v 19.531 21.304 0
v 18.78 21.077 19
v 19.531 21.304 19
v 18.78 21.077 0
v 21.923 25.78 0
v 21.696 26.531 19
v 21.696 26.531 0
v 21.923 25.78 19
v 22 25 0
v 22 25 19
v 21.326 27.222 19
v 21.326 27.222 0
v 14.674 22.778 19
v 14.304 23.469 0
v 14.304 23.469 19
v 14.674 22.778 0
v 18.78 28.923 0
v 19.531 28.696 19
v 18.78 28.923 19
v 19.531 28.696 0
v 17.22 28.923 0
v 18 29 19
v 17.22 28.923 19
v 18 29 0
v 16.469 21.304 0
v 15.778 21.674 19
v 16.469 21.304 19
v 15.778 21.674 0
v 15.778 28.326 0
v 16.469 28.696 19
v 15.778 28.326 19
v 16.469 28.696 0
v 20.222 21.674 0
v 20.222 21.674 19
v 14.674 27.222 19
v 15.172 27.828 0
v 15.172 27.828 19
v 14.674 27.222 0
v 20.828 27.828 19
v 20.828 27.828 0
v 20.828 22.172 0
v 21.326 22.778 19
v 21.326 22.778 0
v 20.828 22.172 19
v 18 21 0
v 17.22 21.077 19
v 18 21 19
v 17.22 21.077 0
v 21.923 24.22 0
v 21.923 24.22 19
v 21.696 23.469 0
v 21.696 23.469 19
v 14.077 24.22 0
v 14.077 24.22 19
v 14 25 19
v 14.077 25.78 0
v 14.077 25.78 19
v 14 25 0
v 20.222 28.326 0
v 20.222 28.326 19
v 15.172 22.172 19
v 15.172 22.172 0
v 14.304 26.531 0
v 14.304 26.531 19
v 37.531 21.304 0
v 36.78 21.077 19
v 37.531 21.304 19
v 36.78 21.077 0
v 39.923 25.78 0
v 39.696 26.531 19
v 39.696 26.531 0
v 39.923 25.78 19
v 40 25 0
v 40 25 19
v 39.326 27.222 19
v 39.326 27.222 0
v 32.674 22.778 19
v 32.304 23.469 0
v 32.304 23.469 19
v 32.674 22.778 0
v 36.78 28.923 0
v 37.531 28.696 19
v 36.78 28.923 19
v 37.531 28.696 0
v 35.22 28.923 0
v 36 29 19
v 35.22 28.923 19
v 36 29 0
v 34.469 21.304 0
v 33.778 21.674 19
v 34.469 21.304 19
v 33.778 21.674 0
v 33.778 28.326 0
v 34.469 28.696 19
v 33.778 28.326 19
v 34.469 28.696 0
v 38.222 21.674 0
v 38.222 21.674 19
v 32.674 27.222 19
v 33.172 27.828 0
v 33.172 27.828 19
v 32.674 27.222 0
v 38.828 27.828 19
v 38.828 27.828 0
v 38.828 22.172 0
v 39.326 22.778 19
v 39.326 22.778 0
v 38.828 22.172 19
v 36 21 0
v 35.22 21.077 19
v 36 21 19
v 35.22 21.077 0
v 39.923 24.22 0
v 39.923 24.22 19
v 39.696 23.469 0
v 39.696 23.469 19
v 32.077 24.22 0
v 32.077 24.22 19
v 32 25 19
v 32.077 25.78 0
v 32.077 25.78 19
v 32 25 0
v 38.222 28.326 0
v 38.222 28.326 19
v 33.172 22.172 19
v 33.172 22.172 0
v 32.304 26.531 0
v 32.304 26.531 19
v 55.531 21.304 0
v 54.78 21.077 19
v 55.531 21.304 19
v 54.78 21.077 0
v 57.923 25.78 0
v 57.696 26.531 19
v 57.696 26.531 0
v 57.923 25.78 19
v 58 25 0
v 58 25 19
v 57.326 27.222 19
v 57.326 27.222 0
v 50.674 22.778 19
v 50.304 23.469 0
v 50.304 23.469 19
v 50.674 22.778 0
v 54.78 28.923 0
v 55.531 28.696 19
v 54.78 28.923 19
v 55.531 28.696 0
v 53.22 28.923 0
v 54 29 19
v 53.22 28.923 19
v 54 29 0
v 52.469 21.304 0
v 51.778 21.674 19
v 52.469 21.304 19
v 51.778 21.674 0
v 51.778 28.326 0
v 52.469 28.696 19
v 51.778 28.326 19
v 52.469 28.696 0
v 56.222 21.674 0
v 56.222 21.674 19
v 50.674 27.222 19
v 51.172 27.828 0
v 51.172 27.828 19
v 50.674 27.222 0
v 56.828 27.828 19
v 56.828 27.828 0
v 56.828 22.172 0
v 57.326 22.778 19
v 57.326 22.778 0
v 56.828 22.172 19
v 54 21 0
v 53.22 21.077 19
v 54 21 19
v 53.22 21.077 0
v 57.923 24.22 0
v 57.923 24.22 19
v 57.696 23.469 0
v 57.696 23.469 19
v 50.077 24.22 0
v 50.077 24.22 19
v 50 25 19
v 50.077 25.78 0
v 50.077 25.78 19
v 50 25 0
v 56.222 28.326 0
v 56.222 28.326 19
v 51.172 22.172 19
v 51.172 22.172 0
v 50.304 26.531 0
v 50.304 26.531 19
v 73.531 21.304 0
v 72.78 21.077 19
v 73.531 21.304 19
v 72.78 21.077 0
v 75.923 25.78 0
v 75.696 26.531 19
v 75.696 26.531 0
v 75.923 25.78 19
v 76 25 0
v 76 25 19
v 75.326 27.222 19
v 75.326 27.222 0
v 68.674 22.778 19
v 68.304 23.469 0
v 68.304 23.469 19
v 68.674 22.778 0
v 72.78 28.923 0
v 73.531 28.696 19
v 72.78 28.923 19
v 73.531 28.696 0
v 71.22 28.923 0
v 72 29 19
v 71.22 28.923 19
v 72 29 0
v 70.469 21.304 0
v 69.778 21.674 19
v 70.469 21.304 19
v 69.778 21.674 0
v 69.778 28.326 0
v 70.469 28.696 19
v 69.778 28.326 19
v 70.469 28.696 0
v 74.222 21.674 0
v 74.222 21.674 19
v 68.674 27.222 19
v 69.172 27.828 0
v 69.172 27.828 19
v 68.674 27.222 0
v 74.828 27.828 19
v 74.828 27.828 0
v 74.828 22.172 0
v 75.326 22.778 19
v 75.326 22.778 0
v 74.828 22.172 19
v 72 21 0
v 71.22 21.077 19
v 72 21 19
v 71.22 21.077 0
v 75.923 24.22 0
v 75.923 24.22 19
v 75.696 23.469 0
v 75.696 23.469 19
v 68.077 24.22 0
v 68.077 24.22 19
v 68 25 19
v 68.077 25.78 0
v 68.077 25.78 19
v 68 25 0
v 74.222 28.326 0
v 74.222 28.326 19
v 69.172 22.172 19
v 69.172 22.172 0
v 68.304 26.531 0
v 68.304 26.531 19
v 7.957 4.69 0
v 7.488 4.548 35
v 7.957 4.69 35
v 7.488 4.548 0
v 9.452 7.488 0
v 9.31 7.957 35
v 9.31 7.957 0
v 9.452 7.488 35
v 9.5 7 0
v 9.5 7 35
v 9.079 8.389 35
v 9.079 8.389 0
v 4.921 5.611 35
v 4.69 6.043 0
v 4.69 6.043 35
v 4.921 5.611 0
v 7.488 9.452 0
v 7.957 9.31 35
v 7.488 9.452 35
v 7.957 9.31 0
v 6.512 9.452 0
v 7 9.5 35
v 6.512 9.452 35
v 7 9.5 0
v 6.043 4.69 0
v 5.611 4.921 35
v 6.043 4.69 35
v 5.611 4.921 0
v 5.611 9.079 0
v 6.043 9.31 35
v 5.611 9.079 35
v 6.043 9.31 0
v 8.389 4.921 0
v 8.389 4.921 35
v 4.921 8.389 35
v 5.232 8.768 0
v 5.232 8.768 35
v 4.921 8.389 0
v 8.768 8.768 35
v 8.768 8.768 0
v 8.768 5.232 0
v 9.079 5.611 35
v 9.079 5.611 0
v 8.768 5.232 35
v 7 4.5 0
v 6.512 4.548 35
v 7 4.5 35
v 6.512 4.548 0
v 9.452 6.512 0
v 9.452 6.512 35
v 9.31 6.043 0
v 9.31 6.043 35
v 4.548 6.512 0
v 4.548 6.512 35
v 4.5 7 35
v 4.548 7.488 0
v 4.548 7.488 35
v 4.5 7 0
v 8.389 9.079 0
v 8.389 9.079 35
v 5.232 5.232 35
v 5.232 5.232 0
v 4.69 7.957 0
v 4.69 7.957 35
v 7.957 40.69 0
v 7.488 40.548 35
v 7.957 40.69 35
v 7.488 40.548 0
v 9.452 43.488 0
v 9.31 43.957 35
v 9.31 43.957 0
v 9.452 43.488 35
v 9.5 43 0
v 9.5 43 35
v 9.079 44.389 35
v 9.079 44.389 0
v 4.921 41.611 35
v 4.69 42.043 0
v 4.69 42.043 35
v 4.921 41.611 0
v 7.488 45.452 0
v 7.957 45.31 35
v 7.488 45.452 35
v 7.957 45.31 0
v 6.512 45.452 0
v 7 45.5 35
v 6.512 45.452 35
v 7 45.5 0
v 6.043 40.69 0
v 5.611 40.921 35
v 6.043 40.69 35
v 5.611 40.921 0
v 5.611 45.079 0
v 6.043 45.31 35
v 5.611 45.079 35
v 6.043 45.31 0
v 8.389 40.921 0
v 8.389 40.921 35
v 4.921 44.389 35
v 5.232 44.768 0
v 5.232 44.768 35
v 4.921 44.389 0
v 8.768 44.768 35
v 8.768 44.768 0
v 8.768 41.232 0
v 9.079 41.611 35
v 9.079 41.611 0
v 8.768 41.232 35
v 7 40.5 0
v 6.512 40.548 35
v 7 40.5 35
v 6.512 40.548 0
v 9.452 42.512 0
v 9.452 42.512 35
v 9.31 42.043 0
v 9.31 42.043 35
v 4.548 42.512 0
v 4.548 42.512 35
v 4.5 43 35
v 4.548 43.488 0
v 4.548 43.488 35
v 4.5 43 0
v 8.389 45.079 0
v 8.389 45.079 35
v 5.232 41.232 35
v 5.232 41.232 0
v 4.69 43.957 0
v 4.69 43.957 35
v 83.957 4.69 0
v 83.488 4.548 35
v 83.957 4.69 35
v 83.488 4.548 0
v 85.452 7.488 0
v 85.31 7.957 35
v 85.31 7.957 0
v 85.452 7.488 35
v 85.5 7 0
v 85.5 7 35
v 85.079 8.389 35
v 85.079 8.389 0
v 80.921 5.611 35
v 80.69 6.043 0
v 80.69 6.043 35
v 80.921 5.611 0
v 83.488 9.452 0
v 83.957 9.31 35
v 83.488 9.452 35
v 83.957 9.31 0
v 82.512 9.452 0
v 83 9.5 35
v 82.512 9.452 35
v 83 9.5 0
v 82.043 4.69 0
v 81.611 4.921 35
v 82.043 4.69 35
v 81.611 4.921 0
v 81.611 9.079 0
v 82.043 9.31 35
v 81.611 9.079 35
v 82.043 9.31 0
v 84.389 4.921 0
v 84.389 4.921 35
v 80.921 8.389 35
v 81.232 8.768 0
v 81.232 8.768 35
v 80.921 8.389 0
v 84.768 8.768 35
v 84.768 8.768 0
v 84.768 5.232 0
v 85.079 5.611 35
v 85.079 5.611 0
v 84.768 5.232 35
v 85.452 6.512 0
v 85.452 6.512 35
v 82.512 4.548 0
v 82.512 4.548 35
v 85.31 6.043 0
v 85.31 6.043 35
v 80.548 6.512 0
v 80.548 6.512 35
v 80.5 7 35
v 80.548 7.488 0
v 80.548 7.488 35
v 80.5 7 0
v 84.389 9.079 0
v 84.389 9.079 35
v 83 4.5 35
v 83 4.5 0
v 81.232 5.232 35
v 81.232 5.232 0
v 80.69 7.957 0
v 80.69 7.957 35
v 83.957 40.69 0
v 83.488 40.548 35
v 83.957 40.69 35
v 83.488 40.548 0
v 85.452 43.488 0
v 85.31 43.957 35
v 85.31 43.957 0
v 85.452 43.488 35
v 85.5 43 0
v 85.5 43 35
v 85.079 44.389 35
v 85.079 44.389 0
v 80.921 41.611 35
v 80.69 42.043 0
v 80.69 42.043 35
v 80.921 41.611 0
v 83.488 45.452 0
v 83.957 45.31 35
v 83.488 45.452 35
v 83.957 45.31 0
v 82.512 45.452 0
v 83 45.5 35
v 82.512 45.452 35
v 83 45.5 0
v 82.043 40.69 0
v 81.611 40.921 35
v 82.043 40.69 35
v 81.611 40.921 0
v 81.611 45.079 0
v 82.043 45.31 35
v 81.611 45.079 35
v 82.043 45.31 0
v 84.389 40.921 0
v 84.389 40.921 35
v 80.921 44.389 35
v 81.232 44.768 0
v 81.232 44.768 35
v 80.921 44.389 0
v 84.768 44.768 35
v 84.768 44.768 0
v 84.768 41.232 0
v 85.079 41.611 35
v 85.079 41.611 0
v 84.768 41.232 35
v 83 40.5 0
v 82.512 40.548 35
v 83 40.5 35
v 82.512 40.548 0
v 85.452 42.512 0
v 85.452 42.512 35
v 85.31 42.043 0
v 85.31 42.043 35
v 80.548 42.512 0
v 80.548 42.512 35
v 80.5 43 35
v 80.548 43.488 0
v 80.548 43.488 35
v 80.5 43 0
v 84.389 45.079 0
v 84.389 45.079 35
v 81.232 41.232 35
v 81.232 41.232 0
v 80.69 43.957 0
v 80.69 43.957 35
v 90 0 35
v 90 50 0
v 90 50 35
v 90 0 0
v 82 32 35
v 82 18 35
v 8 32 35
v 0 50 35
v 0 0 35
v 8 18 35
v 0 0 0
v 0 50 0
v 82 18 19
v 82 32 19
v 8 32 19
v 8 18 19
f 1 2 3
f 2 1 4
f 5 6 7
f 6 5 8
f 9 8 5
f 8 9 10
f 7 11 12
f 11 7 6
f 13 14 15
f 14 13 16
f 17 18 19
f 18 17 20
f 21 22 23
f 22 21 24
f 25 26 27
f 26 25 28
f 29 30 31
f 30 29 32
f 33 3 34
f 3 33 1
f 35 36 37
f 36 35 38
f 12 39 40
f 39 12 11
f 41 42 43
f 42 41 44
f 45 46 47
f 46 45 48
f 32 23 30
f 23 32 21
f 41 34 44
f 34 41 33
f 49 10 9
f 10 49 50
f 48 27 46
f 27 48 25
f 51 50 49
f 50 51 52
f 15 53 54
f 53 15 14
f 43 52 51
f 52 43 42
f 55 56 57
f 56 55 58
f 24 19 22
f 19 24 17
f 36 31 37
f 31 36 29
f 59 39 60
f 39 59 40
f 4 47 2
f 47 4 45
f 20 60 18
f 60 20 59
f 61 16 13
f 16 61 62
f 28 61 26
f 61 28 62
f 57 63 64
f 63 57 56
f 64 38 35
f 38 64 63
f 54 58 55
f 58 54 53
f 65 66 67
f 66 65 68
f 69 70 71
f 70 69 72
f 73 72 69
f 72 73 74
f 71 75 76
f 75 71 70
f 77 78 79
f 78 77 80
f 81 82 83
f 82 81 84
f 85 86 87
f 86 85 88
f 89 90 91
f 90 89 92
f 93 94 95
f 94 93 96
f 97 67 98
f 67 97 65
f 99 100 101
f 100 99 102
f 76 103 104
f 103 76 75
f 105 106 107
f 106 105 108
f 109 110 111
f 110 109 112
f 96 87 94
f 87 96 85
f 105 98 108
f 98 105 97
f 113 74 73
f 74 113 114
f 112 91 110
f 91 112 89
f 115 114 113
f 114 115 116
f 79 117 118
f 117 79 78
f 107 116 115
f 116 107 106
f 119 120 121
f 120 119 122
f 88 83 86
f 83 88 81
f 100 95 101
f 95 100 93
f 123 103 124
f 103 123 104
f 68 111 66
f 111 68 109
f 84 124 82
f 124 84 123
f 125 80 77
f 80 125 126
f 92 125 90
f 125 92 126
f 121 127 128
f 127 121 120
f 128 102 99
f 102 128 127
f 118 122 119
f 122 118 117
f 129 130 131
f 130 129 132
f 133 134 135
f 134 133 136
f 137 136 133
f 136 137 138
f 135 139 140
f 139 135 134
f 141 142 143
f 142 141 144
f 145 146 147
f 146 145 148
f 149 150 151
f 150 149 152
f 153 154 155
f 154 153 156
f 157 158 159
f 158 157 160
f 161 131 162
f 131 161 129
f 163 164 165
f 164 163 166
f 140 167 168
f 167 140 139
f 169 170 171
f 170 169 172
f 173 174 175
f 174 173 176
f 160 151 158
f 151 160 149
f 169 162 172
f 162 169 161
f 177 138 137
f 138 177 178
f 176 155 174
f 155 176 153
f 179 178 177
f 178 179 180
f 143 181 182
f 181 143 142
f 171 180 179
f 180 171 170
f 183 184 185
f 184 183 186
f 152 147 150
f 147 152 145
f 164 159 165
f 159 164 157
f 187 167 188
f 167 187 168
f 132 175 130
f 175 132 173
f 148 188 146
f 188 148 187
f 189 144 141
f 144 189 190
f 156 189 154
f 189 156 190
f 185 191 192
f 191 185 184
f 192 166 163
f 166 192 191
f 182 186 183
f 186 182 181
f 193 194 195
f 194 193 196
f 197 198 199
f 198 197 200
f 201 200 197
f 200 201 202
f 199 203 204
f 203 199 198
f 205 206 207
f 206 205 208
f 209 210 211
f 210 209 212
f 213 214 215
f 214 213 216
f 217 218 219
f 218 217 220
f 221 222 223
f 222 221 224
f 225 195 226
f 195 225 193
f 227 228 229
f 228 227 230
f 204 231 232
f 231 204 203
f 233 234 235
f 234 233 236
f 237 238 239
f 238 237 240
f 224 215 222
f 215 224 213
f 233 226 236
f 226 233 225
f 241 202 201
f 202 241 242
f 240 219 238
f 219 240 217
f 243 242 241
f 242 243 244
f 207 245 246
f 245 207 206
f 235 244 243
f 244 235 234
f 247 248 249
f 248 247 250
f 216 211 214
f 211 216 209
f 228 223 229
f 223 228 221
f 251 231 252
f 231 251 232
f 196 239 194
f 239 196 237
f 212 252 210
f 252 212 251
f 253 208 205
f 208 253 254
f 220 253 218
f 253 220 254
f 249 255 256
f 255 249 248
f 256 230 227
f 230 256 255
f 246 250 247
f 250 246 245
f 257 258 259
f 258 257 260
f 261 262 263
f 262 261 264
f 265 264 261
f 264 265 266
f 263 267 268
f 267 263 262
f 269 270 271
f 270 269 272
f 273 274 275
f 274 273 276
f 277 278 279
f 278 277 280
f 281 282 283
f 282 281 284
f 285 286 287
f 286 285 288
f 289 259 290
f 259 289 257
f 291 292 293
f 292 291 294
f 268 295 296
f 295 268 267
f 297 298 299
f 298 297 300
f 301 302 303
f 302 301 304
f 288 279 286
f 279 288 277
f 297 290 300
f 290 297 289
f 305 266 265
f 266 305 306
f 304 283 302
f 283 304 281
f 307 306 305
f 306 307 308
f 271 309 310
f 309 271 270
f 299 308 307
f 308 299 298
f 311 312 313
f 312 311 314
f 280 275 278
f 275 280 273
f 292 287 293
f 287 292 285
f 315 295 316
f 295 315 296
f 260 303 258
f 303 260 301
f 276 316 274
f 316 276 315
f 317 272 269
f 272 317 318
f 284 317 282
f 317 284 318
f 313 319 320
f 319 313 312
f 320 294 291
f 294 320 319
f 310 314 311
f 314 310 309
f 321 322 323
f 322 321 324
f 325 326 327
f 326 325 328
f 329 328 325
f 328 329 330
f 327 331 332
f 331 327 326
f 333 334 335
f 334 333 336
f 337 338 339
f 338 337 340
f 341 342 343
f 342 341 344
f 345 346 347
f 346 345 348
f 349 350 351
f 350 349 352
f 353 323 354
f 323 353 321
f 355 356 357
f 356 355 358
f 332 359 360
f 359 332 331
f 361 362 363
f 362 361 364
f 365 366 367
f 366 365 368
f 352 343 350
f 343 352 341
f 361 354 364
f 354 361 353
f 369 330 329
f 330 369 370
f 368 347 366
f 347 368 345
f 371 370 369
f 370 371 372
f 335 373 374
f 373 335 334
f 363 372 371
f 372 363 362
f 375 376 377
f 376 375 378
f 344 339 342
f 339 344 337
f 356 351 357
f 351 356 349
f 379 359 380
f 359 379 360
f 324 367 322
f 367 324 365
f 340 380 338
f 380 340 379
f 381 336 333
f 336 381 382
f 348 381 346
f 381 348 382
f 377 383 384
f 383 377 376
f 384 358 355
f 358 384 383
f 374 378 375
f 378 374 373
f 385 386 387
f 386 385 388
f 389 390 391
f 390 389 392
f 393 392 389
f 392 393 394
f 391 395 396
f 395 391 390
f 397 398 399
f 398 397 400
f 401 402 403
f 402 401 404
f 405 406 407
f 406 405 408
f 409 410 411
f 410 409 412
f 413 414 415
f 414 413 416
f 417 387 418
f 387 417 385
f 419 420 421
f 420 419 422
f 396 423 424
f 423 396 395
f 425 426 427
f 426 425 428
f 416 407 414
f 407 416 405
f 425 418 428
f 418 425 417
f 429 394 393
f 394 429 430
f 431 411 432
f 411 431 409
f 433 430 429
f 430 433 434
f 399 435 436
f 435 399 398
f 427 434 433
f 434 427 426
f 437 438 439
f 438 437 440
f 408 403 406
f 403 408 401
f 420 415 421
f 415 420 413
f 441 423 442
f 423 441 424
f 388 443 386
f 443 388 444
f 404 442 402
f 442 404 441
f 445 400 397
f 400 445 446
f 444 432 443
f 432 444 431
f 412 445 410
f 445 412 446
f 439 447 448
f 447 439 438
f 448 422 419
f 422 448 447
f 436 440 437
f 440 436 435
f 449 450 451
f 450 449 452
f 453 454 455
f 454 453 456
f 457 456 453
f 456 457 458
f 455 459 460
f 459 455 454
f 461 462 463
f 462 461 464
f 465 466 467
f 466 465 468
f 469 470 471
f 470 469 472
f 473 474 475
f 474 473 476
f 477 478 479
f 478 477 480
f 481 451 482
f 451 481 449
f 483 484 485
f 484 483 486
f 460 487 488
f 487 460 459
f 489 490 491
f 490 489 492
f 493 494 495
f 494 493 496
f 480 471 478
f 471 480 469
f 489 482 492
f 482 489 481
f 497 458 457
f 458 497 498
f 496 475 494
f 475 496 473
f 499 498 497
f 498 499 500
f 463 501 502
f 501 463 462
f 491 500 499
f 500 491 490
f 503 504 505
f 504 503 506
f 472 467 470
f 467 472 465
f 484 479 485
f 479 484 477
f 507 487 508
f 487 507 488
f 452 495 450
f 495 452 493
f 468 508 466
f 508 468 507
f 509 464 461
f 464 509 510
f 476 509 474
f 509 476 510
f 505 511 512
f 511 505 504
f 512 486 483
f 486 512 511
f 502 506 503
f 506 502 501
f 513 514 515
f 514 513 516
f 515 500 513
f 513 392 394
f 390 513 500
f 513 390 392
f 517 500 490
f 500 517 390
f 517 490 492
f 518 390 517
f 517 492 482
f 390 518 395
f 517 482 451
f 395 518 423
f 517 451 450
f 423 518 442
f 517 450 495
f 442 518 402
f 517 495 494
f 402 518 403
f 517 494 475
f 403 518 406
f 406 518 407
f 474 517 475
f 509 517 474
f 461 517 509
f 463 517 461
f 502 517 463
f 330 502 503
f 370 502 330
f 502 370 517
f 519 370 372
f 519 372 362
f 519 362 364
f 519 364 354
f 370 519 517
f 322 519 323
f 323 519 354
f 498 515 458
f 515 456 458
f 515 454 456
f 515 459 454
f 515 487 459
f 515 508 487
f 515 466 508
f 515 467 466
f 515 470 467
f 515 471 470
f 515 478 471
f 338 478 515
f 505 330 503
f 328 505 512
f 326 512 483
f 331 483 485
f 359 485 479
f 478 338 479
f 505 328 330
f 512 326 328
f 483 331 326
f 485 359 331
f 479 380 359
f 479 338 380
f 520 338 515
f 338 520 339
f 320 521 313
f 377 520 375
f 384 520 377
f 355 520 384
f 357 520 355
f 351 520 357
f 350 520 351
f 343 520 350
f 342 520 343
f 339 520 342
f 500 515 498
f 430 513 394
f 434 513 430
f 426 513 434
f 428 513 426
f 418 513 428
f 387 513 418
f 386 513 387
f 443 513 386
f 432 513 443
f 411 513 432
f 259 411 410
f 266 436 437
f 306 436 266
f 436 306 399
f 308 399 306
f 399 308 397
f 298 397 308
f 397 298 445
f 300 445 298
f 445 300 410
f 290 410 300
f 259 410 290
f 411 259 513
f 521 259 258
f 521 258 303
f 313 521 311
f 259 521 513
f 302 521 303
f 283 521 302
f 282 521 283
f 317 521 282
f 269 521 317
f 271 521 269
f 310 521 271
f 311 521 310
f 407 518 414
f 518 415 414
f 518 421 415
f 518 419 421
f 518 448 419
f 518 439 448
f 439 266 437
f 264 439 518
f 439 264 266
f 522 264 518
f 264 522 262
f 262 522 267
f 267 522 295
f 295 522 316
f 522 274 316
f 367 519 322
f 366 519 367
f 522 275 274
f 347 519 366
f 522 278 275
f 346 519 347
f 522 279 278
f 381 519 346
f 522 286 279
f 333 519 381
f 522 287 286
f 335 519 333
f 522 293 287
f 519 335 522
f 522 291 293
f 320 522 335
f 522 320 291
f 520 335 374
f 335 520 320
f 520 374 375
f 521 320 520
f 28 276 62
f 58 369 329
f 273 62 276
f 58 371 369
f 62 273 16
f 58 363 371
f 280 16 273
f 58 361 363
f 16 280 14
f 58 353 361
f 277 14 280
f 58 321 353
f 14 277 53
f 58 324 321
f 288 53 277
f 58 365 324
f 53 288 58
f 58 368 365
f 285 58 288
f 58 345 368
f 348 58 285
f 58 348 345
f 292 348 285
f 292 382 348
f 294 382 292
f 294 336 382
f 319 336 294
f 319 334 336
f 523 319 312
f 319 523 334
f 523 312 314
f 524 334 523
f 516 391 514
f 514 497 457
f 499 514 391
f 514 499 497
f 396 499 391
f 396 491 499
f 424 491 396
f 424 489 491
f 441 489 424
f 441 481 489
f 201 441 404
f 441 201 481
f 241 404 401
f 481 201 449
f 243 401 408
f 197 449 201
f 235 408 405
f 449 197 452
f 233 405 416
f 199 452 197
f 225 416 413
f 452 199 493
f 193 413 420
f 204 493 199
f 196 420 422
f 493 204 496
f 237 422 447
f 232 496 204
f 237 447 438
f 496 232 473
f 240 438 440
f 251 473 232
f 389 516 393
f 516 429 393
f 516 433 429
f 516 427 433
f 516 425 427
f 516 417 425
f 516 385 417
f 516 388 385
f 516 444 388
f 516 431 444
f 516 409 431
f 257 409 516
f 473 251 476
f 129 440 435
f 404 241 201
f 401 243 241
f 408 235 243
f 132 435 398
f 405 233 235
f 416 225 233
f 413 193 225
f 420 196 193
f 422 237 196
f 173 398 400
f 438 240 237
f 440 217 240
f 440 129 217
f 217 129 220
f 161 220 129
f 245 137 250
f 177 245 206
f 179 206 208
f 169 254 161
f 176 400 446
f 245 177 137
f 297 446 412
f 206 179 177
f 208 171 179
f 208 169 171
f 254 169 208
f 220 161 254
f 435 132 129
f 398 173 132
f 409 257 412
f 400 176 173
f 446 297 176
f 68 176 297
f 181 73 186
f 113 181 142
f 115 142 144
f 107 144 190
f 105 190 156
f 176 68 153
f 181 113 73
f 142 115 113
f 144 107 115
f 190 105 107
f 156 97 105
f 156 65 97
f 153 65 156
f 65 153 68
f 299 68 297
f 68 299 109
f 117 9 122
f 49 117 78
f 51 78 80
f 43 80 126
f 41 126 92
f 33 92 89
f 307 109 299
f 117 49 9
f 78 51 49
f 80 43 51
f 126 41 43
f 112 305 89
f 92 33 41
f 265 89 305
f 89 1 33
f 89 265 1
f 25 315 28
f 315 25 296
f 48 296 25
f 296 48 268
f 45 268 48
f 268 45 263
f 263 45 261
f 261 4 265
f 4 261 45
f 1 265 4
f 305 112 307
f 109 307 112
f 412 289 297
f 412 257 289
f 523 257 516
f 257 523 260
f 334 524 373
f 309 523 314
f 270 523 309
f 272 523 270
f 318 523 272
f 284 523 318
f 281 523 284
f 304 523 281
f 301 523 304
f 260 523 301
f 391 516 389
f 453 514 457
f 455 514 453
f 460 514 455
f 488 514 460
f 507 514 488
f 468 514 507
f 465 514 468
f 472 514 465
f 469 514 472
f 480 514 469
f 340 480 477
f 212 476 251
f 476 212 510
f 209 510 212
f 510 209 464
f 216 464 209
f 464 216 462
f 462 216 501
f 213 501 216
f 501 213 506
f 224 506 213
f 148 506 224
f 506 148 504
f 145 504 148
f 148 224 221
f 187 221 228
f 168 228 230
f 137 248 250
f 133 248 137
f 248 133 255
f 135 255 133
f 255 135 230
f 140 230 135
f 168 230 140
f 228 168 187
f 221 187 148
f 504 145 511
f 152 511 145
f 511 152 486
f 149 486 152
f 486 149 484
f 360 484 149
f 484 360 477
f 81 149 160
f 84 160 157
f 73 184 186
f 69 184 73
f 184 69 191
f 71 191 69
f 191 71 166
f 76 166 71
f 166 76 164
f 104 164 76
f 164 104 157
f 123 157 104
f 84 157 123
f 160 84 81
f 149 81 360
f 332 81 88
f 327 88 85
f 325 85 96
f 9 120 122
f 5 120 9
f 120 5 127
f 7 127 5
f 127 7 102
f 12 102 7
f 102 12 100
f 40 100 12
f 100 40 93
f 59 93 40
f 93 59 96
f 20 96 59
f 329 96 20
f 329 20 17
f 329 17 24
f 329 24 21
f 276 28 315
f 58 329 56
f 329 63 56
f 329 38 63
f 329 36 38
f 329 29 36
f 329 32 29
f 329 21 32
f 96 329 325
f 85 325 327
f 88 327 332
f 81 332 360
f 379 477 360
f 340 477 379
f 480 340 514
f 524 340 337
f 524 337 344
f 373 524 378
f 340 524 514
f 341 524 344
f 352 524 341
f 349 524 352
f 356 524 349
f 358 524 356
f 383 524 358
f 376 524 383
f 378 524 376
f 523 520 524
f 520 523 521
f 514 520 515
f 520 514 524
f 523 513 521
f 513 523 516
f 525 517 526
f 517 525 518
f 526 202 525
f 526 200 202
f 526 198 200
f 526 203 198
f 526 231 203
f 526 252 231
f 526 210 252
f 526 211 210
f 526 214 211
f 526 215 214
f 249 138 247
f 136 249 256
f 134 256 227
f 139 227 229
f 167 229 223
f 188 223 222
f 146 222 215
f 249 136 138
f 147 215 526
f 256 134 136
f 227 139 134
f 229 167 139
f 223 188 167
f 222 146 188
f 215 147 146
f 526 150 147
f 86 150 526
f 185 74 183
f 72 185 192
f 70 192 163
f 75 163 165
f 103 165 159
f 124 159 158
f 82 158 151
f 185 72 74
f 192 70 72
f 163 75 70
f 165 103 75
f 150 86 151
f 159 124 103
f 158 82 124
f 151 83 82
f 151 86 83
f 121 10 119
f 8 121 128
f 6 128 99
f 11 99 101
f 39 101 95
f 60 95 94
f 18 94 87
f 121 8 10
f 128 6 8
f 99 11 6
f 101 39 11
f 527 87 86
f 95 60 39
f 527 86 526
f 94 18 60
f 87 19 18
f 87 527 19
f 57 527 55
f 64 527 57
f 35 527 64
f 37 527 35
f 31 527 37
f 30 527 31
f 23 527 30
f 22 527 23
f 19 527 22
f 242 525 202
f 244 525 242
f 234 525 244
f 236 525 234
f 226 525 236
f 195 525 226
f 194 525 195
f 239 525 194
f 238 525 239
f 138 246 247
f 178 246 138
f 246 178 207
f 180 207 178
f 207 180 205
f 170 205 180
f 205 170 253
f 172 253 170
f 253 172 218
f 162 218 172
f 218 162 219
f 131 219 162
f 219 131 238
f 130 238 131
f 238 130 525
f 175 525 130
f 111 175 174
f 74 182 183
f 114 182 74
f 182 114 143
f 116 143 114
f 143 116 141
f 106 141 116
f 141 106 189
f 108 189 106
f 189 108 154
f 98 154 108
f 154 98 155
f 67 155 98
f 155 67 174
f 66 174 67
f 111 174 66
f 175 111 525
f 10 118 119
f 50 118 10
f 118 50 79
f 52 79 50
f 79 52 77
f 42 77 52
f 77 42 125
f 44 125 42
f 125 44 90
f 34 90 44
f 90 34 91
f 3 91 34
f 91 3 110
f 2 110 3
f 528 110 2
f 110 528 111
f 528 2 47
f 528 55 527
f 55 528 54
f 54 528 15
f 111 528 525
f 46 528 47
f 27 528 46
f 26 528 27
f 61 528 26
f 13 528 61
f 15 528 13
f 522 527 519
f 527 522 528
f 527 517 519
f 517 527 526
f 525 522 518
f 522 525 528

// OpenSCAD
$fn = 32;

// ----------------------------------------------------------------------
// Manifold block: gallery_top manifold
// ----------------------------------------------------------------------

// --- parameters (mm) ---
block_l = 90;             // block length, X
block_w = 50;             // block width, Y
block_h = 35;             // block height, Z
port_d = 8;               // port bore diameter
port_pitch = 18;          // port pitch along X
gallery_d = 14;           // top gallery width, Y
gallery_depth = 16;       // gallery pocket depth
wall_p = 8;               // gallery end wall thickness, X
mnt_d = 5;                // mounting hole diameter
mnt_in = 7;               // mounting hole inset from the edges

n_ports = 4;  // ports in the row
port_x0 = (block_l - (n_ports - 1) * port_pitch) / 2;  // first port X

difference() {
  cube([block_l, block_w, block_h]);
  for (i = [0 : n_ports - 1])
    translate([port_x0 + i * port_pitch, block_w / 2, -1])
      cylinder(h = block_h + 2, d = port_d);
  translate([wall_p, block_w / 2 - gallery_d / 2, block_h - gallery_depth])
    cube([block_l - 2 * wall_p, gallery_d, gallery_depth + 1]);
  for (cx = [mnt_in, block_l - mnt_in])
    for (cy = [mnt_in, block_w - mnt_in])
      translate([cx, cy, -1]) cylinder(h = block_h + 2, d = mnt_d);
}
